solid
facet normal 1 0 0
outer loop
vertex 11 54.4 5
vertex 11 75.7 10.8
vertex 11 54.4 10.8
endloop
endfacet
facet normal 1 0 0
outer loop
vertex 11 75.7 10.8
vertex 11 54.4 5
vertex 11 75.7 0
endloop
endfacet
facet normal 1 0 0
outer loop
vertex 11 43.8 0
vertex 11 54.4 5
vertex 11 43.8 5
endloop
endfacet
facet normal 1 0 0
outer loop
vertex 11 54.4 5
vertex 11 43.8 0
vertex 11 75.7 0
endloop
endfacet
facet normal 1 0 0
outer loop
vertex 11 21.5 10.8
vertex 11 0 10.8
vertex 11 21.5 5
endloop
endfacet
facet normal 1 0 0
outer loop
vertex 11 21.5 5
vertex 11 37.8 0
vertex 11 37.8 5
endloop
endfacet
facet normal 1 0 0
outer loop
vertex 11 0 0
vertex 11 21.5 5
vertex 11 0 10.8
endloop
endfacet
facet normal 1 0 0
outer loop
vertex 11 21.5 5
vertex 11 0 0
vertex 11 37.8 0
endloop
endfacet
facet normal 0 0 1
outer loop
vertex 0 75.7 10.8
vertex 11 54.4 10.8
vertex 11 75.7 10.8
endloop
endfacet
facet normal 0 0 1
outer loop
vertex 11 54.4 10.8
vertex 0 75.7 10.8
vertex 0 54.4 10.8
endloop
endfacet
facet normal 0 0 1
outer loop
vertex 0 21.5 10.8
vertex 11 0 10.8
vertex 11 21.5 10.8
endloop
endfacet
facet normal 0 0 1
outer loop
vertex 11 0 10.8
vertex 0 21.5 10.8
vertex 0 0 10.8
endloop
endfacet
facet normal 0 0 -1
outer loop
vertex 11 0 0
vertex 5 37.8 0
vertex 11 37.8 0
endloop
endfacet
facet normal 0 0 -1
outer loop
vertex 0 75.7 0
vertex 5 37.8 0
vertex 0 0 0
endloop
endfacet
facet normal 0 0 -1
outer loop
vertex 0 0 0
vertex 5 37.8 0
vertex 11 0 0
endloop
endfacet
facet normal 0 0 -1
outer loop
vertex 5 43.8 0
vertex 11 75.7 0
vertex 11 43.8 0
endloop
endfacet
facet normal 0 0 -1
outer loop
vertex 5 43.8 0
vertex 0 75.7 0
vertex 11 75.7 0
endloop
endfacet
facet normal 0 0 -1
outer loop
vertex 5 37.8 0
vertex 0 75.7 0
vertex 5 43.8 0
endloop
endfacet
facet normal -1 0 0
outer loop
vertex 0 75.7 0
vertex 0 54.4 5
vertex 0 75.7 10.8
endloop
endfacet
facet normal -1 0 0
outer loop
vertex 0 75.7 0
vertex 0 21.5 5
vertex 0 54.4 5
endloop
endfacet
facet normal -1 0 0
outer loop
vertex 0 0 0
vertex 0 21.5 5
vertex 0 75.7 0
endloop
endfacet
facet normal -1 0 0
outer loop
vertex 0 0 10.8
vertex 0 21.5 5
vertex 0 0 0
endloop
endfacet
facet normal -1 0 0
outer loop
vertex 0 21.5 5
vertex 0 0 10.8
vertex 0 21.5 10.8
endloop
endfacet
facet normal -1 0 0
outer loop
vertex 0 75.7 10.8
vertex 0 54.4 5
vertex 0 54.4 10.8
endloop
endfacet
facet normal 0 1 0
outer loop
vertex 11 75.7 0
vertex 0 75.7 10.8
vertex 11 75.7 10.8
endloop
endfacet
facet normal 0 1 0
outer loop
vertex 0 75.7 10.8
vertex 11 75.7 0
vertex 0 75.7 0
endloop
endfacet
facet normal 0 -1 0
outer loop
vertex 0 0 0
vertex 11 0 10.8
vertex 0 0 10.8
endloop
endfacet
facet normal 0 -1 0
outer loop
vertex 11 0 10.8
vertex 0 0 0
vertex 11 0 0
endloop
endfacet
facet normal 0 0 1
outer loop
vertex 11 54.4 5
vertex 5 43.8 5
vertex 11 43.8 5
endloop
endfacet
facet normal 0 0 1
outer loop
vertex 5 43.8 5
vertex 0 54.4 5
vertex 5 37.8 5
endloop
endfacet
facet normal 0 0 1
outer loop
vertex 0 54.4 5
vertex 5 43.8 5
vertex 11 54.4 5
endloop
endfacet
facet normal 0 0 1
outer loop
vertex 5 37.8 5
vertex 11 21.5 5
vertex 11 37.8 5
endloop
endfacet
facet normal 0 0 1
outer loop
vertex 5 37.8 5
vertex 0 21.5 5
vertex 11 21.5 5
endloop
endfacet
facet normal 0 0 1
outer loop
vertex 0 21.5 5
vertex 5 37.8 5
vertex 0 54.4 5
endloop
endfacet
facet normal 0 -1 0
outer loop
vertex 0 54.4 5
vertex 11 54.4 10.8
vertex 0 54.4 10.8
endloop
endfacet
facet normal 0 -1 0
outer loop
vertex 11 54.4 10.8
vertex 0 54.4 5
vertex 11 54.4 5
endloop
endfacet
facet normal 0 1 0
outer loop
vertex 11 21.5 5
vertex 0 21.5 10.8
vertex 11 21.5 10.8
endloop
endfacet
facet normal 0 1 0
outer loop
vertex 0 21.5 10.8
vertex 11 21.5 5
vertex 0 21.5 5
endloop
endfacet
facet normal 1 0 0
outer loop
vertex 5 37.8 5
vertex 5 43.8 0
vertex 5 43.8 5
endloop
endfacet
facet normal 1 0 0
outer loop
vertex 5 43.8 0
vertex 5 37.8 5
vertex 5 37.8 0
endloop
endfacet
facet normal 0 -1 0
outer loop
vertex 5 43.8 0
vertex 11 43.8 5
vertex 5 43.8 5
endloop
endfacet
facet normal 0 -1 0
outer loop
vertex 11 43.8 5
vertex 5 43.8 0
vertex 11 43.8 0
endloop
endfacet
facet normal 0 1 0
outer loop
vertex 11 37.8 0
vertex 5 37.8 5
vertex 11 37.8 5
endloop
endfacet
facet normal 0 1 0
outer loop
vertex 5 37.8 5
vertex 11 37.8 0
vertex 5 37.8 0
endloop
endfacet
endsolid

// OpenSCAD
difference(){
cube ([11,75.7,10.8]);
translate([-1,21.5,5]) cube([13,32.9,7]);
translate([5,37.8,-1]) cube([7,6,7]);
}
